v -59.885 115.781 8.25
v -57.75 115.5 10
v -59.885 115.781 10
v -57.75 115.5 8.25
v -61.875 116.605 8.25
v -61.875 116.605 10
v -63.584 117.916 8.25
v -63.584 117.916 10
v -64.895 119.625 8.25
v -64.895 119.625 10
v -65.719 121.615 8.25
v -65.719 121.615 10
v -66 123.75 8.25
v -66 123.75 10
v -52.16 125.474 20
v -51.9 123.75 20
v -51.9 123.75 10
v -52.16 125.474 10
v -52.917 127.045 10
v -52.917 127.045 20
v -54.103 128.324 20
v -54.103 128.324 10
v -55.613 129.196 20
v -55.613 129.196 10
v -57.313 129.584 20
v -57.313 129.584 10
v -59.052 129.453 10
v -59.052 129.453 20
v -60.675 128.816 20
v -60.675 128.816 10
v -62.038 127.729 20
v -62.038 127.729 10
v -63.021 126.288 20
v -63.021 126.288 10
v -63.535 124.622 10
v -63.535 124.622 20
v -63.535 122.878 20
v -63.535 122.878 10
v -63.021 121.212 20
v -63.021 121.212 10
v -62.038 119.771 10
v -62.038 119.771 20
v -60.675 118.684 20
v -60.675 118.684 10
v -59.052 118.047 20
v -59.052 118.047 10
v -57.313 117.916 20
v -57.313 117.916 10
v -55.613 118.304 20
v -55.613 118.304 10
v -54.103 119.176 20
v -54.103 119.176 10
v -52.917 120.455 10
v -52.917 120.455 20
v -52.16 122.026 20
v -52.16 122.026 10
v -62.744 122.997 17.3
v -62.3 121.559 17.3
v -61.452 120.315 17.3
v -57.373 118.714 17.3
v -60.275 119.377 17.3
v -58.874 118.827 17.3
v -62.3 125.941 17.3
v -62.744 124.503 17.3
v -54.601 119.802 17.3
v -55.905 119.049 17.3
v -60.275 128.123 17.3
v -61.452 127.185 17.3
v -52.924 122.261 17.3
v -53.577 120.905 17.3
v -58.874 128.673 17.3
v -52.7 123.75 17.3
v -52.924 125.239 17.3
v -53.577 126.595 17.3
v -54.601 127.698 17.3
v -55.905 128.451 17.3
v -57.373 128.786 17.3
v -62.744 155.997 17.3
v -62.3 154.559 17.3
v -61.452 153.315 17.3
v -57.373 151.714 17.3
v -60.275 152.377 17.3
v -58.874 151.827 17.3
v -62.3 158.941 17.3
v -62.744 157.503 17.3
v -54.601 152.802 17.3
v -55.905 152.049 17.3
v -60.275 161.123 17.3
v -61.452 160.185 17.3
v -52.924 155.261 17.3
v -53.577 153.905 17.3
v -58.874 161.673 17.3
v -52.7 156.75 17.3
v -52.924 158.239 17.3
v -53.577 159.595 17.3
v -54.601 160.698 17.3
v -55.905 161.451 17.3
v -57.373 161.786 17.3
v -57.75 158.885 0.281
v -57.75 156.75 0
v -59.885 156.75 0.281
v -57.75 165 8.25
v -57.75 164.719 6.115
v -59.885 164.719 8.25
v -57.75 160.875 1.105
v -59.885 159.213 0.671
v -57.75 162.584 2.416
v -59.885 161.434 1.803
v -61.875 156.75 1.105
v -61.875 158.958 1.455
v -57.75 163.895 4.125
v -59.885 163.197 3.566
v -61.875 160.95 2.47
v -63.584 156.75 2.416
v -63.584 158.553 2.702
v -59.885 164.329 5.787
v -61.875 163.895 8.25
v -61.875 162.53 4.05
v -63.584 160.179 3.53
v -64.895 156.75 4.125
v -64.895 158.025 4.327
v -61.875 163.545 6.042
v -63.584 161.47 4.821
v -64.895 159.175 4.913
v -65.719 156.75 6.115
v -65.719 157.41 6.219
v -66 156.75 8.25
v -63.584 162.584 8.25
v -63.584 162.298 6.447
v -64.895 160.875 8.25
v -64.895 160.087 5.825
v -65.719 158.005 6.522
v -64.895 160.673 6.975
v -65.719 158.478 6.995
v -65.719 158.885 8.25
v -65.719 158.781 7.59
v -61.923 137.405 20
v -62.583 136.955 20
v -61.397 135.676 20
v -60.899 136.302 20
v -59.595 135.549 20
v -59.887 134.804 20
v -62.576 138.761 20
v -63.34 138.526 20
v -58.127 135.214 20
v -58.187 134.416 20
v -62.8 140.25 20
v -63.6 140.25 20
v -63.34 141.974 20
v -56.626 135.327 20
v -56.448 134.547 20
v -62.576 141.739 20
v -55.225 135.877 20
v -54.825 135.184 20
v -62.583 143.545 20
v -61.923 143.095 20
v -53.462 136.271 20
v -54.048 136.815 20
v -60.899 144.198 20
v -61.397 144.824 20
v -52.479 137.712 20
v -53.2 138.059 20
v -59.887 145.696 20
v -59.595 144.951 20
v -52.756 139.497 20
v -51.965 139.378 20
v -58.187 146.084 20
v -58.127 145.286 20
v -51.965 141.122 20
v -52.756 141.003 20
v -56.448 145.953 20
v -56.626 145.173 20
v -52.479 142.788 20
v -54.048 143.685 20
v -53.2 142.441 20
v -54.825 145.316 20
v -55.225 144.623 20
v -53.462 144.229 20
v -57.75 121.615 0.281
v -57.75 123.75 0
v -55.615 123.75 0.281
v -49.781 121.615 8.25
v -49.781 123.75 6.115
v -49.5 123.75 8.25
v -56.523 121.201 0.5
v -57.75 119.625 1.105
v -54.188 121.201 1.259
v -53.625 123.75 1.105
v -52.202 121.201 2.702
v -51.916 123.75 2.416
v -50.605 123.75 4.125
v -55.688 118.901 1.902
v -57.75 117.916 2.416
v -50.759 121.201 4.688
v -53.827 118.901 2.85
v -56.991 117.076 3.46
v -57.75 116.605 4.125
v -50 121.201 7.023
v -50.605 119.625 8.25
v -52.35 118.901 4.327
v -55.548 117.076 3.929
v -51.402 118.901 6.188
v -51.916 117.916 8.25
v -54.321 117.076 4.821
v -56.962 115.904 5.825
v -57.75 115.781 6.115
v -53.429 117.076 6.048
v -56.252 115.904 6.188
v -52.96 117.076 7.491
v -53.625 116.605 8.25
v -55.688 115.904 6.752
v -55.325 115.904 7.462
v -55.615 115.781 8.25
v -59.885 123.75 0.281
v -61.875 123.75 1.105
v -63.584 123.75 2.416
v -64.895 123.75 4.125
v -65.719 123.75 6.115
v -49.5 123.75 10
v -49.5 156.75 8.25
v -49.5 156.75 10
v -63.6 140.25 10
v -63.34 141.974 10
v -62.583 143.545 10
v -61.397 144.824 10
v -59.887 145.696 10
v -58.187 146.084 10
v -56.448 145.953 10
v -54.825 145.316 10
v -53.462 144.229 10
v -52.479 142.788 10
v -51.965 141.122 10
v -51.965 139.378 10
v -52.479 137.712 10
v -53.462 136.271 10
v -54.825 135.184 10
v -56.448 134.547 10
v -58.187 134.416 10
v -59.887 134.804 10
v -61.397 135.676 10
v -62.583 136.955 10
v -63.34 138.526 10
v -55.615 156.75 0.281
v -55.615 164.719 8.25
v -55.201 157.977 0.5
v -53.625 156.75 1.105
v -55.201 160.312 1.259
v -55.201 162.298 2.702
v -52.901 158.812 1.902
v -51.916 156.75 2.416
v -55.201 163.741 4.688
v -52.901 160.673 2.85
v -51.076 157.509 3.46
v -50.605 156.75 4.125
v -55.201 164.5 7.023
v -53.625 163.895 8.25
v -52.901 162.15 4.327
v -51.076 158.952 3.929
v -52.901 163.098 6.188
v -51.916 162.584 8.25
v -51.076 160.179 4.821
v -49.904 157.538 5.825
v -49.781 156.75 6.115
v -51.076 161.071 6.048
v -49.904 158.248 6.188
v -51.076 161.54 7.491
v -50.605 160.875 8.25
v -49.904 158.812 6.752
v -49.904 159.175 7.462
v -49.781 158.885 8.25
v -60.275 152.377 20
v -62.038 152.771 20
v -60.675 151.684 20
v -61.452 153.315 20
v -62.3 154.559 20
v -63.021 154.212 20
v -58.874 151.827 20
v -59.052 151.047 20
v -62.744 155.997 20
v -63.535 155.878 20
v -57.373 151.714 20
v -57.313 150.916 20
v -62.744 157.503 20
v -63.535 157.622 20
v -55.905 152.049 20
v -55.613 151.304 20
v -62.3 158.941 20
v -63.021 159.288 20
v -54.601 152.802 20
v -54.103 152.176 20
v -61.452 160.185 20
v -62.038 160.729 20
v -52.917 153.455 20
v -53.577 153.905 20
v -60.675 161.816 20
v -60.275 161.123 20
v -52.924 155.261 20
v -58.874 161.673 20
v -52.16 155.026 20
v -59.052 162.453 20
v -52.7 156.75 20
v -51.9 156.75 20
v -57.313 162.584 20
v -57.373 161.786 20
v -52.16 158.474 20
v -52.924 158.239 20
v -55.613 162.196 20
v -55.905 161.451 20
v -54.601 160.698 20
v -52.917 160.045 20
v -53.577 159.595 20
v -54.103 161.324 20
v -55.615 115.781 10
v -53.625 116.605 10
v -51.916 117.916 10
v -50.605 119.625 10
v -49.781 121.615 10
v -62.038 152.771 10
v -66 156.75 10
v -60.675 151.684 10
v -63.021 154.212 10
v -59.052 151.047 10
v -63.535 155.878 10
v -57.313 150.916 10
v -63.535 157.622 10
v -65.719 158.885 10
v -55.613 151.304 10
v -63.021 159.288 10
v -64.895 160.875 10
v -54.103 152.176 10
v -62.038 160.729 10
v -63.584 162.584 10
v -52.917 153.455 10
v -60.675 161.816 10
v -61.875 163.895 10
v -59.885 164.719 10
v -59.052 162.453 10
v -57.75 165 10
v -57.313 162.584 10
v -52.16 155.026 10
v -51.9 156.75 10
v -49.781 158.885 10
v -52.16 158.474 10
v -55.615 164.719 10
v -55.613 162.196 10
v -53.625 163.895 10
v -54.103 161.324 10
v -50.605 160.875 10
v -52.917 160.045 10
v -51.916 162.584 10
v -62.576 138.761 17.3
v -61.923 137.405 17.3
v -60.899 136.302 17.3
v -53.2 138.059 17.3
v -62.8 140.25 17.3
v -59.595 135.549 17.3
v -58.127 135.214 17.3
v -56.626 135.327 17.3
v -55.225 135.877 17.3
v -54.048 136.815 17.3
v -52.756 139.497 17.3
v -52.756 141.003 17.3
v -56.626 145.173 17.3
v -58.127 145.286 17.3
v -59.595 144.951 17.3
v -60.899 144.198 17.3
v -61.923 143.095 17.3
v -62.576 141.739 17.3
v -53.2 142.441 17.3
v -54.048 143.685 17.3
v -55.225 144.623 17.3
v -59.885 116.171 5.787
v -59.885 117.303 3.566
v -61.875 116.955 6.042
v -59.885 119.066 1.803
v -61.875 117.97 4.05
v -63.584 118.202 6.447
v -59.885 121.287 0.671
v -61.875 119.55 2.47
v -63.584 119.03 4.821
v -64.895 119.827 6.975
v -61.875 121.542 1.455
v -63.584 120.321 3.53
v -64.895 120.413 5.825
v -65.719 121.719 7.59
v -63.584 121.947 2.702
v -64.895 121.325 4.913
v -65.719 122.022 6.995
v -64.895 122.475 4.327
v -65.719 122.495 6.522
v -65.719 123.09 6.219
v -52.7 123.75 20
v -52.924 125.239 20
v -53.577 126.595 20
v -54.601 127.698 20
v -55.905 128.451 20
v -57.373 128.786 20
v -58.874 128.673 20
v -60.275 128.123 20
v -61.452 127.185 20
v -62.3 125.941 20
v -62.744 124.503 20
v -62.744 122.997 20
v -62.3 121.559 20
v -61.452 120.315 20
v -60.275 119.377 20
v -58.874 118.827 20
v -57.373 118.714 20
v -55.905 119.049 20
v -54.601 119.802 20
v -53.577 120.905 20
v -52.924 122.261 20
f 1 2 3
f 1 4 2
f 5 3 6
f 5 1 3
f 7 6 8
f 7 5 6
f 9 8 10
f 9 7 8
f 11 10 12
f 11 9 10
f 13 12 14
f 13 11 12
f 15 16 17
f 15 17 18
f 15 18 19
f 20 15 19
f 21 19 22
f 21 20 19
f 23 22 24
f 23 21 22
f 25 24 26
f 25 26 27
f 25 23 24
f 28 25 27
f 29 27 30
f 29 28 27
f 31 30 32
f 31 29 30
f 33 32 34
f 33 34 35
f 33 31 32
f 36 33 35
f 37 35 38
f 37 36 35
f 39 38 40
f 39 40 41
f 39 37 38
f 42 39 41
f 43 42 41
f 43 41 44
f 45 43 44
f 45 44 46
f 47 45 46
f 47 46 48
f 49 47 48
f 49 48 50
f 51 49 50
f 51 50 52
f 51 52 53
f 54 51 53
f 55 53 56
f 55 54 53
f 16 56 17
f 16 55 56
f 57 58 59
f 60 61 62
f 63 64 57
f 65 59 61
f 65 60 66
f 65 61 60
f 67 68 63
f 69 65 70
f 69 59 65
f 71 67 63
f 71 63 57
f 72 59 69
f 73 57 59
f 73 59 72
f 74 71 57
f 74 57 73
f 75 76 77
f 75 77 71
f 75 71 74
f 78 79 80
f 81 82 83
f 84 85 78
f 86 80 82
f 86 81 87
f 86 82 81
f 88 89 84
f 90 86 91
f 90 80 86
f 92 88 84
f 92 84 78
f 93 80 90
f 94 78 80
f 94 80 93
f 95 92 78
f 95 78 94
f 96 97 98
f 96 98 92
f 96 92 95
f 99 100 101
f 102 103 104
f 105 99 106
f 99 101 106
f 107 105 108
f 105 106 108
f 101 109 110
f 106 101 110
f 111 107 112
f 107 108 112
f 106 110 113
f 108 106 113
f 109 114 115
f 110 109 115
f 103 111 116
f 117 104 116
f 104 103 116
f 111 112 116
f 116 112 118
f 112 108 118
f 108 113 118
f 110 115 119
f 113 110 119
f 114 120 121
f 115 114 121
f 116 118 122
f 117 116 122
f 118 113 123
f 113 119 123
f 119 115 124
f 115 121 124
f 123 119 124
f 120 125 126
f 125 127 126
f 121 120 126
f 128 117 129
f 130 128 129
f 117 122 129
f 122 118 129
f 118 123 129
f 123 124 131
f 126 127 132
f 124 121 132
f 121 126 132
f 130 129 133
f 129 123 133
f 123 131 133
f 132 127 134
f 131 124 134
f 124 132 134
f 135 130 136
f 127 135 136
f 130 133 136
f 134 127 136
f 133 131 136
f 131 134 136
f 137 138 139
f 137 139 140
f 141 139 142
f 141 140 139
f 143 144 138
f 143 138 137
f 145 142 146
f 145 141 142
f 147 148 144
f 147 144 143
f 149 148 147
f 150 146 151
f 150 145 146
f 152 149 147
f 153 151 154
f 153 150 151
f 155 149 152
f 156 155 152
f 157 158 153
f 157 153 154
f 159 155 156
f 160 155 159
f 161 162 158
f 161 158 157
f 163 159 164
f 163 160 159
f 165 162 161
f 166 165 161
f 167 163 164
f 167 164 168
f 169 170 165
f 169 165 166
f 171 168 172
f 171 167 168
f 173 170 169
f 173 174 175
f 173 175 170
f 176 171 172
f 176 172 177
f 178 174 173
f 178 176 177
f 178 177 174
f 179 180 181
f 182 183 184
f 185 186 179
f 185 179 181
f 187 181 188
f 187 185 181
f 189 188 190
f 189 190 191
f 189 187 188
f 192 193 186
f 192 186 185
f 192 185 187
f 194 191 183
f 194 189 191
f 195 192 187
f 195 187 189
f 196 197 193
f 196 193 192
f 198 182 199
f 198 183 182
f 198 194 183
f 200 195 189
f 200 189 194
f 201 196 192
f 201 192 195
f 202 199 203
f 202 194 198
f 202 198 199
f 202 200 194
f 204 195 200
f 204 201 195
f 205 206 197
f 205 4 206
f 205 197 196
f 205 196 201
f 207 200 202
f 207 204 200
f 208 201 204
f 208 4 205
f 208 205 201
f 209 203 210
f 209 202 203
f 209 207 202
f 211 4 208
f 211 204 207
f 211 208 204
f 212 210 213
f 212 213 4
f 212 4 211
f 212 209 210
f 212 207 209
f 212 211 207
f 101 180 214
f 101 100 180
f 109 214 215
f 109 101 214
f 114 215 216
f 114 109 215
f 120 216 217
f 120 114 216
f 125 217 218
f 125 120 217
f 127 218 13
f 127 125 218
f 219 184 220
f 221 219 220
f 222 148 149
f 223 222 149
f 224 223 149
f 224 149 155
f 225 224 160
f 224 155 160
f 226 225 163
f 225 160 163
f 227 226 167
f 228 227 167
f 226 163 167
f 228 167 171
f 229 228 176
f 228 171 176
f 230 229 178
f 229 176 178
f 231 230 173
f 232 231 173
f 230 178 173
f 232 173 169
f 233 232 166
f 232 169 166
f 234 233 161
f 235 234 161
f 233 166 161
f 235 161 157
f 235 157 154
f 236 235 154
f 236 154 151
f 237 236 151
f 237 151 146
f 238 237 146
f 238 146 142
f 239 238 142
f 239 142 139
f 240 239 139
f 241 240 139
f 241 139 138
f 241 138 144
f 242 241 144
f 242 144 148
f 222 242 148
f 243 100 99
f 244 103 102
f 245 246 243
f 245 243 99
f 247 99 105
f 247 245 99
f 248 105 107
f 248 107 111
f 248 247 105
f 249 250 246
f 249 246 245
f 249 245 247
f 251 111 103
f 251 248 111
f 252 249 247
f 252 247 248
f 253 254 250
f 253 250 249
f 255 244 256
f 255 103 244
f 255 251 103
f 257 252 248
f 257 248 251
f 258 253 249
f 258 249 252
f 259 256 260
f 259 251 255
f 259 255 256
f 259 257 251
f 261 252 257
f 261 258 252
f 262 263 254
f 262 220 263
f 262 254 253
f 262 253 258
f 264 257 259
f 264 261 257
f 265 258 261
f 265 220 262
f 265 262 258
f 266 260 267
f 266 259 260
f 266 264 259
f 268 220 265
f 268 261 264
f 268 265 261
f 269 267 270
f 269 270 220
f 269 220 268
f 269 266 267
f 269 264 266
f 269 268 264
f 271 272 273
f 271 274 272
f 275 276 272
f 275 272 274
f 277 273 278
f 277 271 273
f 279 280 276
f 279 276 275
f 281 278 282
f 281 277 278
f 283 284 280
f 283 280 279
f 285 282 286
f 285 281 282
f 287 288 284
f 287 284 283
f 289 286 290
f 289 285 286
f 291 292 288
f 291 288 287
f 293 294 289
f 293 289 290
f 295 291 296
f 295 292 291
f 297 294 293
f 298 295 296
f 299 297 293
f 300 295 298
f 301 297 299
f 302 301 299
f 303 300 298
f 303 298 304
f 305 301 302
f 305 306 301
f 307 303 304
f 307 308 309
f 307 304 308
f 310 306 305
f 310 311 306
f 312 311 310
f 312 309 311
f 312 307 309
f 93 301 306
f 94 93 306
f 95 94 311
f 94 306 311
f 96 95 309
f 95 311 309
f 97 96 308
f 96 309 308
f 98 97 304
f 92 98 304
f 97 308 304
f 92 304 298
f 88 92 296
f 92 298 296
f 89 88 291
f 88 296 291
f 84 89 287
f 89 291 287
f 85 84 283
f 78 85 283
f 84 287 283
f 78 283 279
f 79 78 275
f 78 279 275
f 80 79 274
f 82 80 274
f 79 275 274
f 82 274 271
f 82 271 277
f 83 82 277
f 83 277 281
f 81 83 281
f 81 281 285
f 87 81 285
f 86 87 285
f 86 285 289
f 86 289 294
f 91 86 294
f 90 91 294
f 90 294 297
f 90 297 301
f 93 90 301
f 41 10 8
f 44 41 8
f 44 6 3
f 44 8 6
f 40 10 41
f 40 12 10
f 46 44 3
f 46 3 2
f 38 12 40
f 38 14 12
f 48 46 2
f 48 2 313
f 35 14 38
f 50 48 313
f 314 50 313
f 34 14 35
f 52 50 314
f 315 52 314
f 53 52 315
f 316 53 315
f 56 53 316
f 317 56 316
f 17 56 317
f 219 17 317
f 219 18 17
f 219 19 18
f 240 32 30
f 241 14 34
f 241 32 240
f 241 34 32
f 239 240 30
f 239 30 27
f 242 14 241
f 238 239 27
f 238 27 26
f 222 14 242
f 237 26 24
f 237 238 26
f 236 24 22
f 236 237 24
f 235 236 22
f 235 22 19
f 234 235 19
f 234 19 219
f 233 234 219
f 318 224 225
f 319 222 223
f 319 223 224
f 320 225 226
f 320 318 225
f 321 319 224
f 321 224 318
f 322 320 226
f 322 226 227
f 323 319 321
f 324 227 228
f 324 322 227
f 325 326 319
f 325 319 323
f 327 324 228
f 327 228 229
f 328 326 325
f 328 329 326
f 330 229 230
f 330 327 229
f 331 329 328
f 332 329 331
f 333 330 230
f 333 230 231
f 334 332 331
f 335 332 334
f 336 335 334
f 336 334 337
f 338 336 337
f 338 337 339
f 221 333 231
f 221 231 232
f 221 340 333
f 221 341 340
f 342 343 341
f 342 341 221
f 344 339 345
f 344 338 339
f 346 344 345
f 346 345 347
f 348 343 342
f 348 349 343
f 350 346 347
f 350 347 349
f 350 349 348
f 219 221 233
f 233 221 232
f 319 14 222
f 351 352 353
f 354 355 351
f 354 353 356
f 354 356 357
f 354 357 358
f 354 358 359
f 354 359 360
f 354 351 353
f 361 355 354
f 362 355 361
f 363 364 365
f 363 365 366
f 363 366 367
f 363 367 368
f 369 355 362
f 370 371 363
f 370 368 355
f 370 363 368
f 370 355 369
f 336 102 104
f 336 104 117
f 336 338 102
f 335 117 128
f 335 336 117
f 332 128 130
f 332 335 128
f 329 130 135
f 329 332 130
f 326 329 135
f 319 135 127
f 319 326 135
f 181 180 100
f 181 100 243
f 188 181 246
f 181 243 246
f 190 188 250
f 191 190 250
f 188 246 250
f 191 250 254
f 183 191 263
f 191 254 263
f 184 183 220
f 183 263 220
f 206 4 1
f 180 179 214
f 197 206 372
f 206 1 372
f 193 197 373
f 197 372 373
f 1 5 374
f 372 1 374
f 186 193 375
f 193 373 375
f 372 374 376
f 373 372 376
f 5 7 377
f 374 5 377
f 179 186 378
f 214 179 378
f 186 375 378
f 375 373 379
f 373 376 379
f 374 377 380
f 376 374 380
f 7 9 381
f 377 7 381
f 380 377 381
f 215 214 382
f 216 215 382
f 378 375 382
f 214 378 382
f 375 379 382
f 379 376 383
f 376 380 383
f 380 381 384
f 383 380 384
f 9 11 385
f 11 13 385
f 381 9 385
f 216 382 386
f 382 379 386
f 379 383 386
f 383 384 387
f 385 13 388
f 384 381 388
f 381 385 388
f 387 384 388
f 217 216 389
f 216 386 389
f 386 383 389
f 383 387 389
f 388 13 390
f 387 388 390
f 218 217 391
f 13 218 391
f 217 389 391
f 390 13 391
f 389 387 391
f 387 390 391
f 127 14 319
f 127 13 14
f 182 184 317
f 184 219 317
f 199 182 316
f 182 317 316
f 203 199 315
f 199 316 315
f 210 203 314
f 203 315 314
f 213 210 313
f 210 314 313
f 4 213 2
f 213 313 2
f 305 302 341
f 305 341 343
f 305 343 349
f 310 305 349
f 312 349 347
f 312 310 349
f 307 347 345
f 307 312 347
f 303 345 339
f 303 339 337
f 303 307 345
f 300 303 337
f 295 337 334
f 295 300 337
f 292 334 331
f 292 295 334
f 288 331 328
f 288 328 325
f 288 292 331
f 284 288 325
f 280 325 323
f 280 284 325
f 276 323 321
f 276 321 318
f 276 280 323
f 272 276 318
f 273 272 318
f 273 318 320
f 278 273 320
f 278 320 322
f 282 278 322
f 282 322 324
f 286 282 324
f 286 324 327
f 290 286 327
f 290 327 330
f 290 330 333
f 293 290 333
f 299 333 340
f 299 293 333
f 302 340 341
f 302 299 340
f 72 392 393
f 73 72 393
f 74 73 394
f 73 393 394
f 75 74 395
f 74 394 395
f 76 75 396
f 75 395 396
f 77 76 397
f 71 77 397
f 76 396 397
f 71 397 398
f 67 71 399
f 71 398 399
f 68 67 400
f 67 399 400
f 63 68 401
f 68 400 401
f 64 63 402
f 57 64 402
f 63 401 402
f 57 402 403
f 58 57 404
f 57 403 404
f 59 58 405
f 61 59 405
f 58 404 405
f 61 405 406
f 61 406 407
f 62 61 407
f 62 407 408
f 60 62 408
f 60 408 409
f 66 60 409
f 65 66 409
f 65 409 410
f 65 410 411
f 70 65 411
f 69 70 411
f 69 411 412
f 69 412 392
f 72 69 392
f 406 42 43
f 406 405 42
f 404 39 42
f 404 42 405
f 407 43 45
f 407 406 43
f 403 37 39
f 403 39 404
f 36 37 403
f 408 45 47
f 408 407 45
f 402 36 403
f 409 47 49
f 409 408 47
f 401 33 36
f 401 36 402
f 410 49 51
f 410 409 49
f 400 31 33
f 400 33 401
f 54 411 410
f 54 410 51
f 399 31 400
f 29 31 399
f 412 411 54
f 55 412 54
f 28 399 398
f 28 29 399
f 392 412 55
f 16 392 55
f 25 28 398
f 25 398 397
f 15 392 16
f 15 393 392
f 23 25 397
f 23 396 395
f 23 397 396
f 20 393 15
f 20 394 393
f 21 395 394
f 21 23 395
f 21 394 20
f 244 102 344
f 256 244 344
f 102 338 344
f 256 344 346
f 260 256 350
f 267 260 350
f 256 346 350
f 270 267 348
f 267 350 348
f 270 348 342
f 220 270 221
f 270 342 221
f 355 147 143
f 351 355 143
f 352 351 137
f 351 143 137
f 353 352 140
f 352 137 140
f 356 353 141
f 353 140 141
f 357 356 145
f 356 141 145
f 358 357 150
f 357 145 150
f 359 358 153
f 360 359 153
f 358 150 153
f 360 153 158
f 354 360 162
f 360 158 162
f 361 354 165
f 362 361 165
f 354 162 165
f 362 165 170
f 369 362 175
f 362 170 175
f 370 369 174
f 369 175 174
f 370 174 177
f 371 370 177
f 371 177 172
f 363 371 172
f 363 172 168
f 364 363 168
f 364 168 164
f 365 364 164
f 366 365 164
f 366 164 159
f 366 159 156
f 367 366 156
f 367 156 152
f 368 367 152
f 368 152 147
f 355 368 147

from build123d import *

# Parameters (mm, degrees)
SKETCH1_W           = 16.5
SKETCH1_H           = 49.5
BOSS_EXTRUDE1_DEPTH = 20
SKETCH2_R           = 5.85
SKETCH2_R_2         = 5.05
CUT_EXTRUDE1_DEPTH  = 10
FILLET1_R           = 8.25
SKETCH5_R           = 5.1
BOSS_EXTRUDE2_DEPTH = 7.3


with BuildPart() as part:
    # Sketch1 → Boss-Extrude1 (new body)
    with BuildSketch(Plane.XY):
        with Locations((-57.75, 140.25)):
            Rectangle(SKETCH1_W, SKETCH1_H)
    extrude(amount=BOSS_EXTRUDE1_DEPTH)

    # Sketch2 → Cut-Extrude1 (cut)
    # profile 1 of 8: a face of its own
    with BuildSketch(Plane.XY.offset(20)):
        with BuildLine():
            ThreePointArc((-63.6, 140.25), (-57.75, 146.1), (-51.9, 140.25))
            Line((-51.9, 140.25), (-49.5, 140.25))
            Line((-49.5, 140.25), (-49.5, 165))
            Line((-49.5, 165), (-66, 165))
            Line((-66, 165), (-66, 140.25))
            Line((-66, 140.25), (-63.6, 140.25))
        make_face()
        with Locations((-57.75, 156.75)):
            Circle(SKETCH2_R, mode=Mode.SUBTRACT)
    # profile 2 of 8: a face of its own
    with BuildSketch(Plane.XY.offset(20)):
        with BuildLine():
            Line((-49.5, 140.25), (-51.9, 140.25))
            ThreePointArc((-51.9, 140.25), (-57.75, 134.4), (-63.6, 140.25))
            Line((-63.6, 140.25), (-66, 140.25))
            Line((-66, 140.25), (-66, 115.5))
            Line((-66, 115.5), (-49.5, 115.5))
            Line((-49.5, 115.5), (-49.5, 140.25))
        make_face()
        with Locations((-57.75, 123.75)):
            Circle(SKETCH2_R, mode=Mode.SUBTRACT)
    # profile 3 of 8: a face of its own
    with BuildSketch(Plane.XY.offset(20)):
        with Locations((-57.75, 156.75)):
            Circle(SKETCH2_R_2)
    # profile 4 of 8: a face of its own
    with BuildSketch(Plane.XY.offset(20)):
        with BuildLine():
            ThreePointArc((-62.8, 140.25), (-57.75, 135.2), (-52.7, 140.25))
            Line((-52.7, 140.25), (-62.8, 140.25))
        make_face()
    # profile 5 of 8: a face of its own
    with BuildSketch(Plane.XY.offset(20)):
        with BuildLine():
            Line((-62.8, 140.25), (-52.7, 140.25))
            ThreePointArc((-52.7, 140.25), (-57.75, 145.3), (-62.8, 140.25))
        make_face()
    # profile 6 of 8: a face of its own
    with BuildSketch(Plane.XY.offset(20)):
        with BuildLine():
            ThreePointArc((-62.8, 140.25), (-57.75, 135.2), (-52.7, 140.25))
            Line((-52.7, 140.25), (-62.8, 140.25))
        make_face()
    # profile 7 of 8: a face of its own
    with BuildSketch(Plane.XY.offset(20)):
        with BuildLine():
            Line((-62.8, 140.25), (-52.7, 140.25))
            ThreePointArc((-52.7, 140.25), (-57.75, 145.3), (-62.8, 140.25))
        make_face()
    # profile 8 of 8: a face of its own
    with BuildSketch(Plane.XY.offset(20)):
        with Locations((-57.75, 123.75)):
            Circle(SKETCH2_R_2)
    extrude(amount=-CUT_EXTRUDE1_DEPTH, mode=Mode.SUBTRACT)

    # Fillet1
    fillet1_edges = [part.edges().sort_by_distance(p)[0] for p in [
        (-57.75, 165, 0),
    ]]
    fillet(fillet1_edges, radius=FILLET1_R)
    fillet1_2_edges = [part.edges().sort_by_distance(p)[0] for p in [
        (-49.5, 136.125, 0),
    ]]
    fillet(fillet1_2_edges, radius=FILLET1_R)
    fillet1_3_edges = [part.edges().sort_by_distance(p)[0] for p in [
        (-61.875, 115.5, 0),
    ]]
    fillet(fillet1_3_edges, radius=FILLET1_R)
    fillet1_4_edges = [part.edges().sort_by_distance(p)[0] for p in [
        (-66, 140.25, 0),
    ]]
    fillet(fillet1_4_edges, radius=FILLET1_R - 0.0001)  # a hair under: the kernel refuses the full size

    # Sketch5 → Boss-Extrude2 (add)
    with BuildSketch(Plane.XY.offset(10)):
        with Locations((-57.75, 156.75)):
            Circle(SKETCH5_R)
        with Locations((-57.75, 140.25)):
            Circle(SKETCH5_R)
        with Locations((-57.75, 123.75)):
            Circle(SKETCH5_R)
    extrude(amount=BOSS_EXTRUDE2_DEPTH)


solid = part.part
